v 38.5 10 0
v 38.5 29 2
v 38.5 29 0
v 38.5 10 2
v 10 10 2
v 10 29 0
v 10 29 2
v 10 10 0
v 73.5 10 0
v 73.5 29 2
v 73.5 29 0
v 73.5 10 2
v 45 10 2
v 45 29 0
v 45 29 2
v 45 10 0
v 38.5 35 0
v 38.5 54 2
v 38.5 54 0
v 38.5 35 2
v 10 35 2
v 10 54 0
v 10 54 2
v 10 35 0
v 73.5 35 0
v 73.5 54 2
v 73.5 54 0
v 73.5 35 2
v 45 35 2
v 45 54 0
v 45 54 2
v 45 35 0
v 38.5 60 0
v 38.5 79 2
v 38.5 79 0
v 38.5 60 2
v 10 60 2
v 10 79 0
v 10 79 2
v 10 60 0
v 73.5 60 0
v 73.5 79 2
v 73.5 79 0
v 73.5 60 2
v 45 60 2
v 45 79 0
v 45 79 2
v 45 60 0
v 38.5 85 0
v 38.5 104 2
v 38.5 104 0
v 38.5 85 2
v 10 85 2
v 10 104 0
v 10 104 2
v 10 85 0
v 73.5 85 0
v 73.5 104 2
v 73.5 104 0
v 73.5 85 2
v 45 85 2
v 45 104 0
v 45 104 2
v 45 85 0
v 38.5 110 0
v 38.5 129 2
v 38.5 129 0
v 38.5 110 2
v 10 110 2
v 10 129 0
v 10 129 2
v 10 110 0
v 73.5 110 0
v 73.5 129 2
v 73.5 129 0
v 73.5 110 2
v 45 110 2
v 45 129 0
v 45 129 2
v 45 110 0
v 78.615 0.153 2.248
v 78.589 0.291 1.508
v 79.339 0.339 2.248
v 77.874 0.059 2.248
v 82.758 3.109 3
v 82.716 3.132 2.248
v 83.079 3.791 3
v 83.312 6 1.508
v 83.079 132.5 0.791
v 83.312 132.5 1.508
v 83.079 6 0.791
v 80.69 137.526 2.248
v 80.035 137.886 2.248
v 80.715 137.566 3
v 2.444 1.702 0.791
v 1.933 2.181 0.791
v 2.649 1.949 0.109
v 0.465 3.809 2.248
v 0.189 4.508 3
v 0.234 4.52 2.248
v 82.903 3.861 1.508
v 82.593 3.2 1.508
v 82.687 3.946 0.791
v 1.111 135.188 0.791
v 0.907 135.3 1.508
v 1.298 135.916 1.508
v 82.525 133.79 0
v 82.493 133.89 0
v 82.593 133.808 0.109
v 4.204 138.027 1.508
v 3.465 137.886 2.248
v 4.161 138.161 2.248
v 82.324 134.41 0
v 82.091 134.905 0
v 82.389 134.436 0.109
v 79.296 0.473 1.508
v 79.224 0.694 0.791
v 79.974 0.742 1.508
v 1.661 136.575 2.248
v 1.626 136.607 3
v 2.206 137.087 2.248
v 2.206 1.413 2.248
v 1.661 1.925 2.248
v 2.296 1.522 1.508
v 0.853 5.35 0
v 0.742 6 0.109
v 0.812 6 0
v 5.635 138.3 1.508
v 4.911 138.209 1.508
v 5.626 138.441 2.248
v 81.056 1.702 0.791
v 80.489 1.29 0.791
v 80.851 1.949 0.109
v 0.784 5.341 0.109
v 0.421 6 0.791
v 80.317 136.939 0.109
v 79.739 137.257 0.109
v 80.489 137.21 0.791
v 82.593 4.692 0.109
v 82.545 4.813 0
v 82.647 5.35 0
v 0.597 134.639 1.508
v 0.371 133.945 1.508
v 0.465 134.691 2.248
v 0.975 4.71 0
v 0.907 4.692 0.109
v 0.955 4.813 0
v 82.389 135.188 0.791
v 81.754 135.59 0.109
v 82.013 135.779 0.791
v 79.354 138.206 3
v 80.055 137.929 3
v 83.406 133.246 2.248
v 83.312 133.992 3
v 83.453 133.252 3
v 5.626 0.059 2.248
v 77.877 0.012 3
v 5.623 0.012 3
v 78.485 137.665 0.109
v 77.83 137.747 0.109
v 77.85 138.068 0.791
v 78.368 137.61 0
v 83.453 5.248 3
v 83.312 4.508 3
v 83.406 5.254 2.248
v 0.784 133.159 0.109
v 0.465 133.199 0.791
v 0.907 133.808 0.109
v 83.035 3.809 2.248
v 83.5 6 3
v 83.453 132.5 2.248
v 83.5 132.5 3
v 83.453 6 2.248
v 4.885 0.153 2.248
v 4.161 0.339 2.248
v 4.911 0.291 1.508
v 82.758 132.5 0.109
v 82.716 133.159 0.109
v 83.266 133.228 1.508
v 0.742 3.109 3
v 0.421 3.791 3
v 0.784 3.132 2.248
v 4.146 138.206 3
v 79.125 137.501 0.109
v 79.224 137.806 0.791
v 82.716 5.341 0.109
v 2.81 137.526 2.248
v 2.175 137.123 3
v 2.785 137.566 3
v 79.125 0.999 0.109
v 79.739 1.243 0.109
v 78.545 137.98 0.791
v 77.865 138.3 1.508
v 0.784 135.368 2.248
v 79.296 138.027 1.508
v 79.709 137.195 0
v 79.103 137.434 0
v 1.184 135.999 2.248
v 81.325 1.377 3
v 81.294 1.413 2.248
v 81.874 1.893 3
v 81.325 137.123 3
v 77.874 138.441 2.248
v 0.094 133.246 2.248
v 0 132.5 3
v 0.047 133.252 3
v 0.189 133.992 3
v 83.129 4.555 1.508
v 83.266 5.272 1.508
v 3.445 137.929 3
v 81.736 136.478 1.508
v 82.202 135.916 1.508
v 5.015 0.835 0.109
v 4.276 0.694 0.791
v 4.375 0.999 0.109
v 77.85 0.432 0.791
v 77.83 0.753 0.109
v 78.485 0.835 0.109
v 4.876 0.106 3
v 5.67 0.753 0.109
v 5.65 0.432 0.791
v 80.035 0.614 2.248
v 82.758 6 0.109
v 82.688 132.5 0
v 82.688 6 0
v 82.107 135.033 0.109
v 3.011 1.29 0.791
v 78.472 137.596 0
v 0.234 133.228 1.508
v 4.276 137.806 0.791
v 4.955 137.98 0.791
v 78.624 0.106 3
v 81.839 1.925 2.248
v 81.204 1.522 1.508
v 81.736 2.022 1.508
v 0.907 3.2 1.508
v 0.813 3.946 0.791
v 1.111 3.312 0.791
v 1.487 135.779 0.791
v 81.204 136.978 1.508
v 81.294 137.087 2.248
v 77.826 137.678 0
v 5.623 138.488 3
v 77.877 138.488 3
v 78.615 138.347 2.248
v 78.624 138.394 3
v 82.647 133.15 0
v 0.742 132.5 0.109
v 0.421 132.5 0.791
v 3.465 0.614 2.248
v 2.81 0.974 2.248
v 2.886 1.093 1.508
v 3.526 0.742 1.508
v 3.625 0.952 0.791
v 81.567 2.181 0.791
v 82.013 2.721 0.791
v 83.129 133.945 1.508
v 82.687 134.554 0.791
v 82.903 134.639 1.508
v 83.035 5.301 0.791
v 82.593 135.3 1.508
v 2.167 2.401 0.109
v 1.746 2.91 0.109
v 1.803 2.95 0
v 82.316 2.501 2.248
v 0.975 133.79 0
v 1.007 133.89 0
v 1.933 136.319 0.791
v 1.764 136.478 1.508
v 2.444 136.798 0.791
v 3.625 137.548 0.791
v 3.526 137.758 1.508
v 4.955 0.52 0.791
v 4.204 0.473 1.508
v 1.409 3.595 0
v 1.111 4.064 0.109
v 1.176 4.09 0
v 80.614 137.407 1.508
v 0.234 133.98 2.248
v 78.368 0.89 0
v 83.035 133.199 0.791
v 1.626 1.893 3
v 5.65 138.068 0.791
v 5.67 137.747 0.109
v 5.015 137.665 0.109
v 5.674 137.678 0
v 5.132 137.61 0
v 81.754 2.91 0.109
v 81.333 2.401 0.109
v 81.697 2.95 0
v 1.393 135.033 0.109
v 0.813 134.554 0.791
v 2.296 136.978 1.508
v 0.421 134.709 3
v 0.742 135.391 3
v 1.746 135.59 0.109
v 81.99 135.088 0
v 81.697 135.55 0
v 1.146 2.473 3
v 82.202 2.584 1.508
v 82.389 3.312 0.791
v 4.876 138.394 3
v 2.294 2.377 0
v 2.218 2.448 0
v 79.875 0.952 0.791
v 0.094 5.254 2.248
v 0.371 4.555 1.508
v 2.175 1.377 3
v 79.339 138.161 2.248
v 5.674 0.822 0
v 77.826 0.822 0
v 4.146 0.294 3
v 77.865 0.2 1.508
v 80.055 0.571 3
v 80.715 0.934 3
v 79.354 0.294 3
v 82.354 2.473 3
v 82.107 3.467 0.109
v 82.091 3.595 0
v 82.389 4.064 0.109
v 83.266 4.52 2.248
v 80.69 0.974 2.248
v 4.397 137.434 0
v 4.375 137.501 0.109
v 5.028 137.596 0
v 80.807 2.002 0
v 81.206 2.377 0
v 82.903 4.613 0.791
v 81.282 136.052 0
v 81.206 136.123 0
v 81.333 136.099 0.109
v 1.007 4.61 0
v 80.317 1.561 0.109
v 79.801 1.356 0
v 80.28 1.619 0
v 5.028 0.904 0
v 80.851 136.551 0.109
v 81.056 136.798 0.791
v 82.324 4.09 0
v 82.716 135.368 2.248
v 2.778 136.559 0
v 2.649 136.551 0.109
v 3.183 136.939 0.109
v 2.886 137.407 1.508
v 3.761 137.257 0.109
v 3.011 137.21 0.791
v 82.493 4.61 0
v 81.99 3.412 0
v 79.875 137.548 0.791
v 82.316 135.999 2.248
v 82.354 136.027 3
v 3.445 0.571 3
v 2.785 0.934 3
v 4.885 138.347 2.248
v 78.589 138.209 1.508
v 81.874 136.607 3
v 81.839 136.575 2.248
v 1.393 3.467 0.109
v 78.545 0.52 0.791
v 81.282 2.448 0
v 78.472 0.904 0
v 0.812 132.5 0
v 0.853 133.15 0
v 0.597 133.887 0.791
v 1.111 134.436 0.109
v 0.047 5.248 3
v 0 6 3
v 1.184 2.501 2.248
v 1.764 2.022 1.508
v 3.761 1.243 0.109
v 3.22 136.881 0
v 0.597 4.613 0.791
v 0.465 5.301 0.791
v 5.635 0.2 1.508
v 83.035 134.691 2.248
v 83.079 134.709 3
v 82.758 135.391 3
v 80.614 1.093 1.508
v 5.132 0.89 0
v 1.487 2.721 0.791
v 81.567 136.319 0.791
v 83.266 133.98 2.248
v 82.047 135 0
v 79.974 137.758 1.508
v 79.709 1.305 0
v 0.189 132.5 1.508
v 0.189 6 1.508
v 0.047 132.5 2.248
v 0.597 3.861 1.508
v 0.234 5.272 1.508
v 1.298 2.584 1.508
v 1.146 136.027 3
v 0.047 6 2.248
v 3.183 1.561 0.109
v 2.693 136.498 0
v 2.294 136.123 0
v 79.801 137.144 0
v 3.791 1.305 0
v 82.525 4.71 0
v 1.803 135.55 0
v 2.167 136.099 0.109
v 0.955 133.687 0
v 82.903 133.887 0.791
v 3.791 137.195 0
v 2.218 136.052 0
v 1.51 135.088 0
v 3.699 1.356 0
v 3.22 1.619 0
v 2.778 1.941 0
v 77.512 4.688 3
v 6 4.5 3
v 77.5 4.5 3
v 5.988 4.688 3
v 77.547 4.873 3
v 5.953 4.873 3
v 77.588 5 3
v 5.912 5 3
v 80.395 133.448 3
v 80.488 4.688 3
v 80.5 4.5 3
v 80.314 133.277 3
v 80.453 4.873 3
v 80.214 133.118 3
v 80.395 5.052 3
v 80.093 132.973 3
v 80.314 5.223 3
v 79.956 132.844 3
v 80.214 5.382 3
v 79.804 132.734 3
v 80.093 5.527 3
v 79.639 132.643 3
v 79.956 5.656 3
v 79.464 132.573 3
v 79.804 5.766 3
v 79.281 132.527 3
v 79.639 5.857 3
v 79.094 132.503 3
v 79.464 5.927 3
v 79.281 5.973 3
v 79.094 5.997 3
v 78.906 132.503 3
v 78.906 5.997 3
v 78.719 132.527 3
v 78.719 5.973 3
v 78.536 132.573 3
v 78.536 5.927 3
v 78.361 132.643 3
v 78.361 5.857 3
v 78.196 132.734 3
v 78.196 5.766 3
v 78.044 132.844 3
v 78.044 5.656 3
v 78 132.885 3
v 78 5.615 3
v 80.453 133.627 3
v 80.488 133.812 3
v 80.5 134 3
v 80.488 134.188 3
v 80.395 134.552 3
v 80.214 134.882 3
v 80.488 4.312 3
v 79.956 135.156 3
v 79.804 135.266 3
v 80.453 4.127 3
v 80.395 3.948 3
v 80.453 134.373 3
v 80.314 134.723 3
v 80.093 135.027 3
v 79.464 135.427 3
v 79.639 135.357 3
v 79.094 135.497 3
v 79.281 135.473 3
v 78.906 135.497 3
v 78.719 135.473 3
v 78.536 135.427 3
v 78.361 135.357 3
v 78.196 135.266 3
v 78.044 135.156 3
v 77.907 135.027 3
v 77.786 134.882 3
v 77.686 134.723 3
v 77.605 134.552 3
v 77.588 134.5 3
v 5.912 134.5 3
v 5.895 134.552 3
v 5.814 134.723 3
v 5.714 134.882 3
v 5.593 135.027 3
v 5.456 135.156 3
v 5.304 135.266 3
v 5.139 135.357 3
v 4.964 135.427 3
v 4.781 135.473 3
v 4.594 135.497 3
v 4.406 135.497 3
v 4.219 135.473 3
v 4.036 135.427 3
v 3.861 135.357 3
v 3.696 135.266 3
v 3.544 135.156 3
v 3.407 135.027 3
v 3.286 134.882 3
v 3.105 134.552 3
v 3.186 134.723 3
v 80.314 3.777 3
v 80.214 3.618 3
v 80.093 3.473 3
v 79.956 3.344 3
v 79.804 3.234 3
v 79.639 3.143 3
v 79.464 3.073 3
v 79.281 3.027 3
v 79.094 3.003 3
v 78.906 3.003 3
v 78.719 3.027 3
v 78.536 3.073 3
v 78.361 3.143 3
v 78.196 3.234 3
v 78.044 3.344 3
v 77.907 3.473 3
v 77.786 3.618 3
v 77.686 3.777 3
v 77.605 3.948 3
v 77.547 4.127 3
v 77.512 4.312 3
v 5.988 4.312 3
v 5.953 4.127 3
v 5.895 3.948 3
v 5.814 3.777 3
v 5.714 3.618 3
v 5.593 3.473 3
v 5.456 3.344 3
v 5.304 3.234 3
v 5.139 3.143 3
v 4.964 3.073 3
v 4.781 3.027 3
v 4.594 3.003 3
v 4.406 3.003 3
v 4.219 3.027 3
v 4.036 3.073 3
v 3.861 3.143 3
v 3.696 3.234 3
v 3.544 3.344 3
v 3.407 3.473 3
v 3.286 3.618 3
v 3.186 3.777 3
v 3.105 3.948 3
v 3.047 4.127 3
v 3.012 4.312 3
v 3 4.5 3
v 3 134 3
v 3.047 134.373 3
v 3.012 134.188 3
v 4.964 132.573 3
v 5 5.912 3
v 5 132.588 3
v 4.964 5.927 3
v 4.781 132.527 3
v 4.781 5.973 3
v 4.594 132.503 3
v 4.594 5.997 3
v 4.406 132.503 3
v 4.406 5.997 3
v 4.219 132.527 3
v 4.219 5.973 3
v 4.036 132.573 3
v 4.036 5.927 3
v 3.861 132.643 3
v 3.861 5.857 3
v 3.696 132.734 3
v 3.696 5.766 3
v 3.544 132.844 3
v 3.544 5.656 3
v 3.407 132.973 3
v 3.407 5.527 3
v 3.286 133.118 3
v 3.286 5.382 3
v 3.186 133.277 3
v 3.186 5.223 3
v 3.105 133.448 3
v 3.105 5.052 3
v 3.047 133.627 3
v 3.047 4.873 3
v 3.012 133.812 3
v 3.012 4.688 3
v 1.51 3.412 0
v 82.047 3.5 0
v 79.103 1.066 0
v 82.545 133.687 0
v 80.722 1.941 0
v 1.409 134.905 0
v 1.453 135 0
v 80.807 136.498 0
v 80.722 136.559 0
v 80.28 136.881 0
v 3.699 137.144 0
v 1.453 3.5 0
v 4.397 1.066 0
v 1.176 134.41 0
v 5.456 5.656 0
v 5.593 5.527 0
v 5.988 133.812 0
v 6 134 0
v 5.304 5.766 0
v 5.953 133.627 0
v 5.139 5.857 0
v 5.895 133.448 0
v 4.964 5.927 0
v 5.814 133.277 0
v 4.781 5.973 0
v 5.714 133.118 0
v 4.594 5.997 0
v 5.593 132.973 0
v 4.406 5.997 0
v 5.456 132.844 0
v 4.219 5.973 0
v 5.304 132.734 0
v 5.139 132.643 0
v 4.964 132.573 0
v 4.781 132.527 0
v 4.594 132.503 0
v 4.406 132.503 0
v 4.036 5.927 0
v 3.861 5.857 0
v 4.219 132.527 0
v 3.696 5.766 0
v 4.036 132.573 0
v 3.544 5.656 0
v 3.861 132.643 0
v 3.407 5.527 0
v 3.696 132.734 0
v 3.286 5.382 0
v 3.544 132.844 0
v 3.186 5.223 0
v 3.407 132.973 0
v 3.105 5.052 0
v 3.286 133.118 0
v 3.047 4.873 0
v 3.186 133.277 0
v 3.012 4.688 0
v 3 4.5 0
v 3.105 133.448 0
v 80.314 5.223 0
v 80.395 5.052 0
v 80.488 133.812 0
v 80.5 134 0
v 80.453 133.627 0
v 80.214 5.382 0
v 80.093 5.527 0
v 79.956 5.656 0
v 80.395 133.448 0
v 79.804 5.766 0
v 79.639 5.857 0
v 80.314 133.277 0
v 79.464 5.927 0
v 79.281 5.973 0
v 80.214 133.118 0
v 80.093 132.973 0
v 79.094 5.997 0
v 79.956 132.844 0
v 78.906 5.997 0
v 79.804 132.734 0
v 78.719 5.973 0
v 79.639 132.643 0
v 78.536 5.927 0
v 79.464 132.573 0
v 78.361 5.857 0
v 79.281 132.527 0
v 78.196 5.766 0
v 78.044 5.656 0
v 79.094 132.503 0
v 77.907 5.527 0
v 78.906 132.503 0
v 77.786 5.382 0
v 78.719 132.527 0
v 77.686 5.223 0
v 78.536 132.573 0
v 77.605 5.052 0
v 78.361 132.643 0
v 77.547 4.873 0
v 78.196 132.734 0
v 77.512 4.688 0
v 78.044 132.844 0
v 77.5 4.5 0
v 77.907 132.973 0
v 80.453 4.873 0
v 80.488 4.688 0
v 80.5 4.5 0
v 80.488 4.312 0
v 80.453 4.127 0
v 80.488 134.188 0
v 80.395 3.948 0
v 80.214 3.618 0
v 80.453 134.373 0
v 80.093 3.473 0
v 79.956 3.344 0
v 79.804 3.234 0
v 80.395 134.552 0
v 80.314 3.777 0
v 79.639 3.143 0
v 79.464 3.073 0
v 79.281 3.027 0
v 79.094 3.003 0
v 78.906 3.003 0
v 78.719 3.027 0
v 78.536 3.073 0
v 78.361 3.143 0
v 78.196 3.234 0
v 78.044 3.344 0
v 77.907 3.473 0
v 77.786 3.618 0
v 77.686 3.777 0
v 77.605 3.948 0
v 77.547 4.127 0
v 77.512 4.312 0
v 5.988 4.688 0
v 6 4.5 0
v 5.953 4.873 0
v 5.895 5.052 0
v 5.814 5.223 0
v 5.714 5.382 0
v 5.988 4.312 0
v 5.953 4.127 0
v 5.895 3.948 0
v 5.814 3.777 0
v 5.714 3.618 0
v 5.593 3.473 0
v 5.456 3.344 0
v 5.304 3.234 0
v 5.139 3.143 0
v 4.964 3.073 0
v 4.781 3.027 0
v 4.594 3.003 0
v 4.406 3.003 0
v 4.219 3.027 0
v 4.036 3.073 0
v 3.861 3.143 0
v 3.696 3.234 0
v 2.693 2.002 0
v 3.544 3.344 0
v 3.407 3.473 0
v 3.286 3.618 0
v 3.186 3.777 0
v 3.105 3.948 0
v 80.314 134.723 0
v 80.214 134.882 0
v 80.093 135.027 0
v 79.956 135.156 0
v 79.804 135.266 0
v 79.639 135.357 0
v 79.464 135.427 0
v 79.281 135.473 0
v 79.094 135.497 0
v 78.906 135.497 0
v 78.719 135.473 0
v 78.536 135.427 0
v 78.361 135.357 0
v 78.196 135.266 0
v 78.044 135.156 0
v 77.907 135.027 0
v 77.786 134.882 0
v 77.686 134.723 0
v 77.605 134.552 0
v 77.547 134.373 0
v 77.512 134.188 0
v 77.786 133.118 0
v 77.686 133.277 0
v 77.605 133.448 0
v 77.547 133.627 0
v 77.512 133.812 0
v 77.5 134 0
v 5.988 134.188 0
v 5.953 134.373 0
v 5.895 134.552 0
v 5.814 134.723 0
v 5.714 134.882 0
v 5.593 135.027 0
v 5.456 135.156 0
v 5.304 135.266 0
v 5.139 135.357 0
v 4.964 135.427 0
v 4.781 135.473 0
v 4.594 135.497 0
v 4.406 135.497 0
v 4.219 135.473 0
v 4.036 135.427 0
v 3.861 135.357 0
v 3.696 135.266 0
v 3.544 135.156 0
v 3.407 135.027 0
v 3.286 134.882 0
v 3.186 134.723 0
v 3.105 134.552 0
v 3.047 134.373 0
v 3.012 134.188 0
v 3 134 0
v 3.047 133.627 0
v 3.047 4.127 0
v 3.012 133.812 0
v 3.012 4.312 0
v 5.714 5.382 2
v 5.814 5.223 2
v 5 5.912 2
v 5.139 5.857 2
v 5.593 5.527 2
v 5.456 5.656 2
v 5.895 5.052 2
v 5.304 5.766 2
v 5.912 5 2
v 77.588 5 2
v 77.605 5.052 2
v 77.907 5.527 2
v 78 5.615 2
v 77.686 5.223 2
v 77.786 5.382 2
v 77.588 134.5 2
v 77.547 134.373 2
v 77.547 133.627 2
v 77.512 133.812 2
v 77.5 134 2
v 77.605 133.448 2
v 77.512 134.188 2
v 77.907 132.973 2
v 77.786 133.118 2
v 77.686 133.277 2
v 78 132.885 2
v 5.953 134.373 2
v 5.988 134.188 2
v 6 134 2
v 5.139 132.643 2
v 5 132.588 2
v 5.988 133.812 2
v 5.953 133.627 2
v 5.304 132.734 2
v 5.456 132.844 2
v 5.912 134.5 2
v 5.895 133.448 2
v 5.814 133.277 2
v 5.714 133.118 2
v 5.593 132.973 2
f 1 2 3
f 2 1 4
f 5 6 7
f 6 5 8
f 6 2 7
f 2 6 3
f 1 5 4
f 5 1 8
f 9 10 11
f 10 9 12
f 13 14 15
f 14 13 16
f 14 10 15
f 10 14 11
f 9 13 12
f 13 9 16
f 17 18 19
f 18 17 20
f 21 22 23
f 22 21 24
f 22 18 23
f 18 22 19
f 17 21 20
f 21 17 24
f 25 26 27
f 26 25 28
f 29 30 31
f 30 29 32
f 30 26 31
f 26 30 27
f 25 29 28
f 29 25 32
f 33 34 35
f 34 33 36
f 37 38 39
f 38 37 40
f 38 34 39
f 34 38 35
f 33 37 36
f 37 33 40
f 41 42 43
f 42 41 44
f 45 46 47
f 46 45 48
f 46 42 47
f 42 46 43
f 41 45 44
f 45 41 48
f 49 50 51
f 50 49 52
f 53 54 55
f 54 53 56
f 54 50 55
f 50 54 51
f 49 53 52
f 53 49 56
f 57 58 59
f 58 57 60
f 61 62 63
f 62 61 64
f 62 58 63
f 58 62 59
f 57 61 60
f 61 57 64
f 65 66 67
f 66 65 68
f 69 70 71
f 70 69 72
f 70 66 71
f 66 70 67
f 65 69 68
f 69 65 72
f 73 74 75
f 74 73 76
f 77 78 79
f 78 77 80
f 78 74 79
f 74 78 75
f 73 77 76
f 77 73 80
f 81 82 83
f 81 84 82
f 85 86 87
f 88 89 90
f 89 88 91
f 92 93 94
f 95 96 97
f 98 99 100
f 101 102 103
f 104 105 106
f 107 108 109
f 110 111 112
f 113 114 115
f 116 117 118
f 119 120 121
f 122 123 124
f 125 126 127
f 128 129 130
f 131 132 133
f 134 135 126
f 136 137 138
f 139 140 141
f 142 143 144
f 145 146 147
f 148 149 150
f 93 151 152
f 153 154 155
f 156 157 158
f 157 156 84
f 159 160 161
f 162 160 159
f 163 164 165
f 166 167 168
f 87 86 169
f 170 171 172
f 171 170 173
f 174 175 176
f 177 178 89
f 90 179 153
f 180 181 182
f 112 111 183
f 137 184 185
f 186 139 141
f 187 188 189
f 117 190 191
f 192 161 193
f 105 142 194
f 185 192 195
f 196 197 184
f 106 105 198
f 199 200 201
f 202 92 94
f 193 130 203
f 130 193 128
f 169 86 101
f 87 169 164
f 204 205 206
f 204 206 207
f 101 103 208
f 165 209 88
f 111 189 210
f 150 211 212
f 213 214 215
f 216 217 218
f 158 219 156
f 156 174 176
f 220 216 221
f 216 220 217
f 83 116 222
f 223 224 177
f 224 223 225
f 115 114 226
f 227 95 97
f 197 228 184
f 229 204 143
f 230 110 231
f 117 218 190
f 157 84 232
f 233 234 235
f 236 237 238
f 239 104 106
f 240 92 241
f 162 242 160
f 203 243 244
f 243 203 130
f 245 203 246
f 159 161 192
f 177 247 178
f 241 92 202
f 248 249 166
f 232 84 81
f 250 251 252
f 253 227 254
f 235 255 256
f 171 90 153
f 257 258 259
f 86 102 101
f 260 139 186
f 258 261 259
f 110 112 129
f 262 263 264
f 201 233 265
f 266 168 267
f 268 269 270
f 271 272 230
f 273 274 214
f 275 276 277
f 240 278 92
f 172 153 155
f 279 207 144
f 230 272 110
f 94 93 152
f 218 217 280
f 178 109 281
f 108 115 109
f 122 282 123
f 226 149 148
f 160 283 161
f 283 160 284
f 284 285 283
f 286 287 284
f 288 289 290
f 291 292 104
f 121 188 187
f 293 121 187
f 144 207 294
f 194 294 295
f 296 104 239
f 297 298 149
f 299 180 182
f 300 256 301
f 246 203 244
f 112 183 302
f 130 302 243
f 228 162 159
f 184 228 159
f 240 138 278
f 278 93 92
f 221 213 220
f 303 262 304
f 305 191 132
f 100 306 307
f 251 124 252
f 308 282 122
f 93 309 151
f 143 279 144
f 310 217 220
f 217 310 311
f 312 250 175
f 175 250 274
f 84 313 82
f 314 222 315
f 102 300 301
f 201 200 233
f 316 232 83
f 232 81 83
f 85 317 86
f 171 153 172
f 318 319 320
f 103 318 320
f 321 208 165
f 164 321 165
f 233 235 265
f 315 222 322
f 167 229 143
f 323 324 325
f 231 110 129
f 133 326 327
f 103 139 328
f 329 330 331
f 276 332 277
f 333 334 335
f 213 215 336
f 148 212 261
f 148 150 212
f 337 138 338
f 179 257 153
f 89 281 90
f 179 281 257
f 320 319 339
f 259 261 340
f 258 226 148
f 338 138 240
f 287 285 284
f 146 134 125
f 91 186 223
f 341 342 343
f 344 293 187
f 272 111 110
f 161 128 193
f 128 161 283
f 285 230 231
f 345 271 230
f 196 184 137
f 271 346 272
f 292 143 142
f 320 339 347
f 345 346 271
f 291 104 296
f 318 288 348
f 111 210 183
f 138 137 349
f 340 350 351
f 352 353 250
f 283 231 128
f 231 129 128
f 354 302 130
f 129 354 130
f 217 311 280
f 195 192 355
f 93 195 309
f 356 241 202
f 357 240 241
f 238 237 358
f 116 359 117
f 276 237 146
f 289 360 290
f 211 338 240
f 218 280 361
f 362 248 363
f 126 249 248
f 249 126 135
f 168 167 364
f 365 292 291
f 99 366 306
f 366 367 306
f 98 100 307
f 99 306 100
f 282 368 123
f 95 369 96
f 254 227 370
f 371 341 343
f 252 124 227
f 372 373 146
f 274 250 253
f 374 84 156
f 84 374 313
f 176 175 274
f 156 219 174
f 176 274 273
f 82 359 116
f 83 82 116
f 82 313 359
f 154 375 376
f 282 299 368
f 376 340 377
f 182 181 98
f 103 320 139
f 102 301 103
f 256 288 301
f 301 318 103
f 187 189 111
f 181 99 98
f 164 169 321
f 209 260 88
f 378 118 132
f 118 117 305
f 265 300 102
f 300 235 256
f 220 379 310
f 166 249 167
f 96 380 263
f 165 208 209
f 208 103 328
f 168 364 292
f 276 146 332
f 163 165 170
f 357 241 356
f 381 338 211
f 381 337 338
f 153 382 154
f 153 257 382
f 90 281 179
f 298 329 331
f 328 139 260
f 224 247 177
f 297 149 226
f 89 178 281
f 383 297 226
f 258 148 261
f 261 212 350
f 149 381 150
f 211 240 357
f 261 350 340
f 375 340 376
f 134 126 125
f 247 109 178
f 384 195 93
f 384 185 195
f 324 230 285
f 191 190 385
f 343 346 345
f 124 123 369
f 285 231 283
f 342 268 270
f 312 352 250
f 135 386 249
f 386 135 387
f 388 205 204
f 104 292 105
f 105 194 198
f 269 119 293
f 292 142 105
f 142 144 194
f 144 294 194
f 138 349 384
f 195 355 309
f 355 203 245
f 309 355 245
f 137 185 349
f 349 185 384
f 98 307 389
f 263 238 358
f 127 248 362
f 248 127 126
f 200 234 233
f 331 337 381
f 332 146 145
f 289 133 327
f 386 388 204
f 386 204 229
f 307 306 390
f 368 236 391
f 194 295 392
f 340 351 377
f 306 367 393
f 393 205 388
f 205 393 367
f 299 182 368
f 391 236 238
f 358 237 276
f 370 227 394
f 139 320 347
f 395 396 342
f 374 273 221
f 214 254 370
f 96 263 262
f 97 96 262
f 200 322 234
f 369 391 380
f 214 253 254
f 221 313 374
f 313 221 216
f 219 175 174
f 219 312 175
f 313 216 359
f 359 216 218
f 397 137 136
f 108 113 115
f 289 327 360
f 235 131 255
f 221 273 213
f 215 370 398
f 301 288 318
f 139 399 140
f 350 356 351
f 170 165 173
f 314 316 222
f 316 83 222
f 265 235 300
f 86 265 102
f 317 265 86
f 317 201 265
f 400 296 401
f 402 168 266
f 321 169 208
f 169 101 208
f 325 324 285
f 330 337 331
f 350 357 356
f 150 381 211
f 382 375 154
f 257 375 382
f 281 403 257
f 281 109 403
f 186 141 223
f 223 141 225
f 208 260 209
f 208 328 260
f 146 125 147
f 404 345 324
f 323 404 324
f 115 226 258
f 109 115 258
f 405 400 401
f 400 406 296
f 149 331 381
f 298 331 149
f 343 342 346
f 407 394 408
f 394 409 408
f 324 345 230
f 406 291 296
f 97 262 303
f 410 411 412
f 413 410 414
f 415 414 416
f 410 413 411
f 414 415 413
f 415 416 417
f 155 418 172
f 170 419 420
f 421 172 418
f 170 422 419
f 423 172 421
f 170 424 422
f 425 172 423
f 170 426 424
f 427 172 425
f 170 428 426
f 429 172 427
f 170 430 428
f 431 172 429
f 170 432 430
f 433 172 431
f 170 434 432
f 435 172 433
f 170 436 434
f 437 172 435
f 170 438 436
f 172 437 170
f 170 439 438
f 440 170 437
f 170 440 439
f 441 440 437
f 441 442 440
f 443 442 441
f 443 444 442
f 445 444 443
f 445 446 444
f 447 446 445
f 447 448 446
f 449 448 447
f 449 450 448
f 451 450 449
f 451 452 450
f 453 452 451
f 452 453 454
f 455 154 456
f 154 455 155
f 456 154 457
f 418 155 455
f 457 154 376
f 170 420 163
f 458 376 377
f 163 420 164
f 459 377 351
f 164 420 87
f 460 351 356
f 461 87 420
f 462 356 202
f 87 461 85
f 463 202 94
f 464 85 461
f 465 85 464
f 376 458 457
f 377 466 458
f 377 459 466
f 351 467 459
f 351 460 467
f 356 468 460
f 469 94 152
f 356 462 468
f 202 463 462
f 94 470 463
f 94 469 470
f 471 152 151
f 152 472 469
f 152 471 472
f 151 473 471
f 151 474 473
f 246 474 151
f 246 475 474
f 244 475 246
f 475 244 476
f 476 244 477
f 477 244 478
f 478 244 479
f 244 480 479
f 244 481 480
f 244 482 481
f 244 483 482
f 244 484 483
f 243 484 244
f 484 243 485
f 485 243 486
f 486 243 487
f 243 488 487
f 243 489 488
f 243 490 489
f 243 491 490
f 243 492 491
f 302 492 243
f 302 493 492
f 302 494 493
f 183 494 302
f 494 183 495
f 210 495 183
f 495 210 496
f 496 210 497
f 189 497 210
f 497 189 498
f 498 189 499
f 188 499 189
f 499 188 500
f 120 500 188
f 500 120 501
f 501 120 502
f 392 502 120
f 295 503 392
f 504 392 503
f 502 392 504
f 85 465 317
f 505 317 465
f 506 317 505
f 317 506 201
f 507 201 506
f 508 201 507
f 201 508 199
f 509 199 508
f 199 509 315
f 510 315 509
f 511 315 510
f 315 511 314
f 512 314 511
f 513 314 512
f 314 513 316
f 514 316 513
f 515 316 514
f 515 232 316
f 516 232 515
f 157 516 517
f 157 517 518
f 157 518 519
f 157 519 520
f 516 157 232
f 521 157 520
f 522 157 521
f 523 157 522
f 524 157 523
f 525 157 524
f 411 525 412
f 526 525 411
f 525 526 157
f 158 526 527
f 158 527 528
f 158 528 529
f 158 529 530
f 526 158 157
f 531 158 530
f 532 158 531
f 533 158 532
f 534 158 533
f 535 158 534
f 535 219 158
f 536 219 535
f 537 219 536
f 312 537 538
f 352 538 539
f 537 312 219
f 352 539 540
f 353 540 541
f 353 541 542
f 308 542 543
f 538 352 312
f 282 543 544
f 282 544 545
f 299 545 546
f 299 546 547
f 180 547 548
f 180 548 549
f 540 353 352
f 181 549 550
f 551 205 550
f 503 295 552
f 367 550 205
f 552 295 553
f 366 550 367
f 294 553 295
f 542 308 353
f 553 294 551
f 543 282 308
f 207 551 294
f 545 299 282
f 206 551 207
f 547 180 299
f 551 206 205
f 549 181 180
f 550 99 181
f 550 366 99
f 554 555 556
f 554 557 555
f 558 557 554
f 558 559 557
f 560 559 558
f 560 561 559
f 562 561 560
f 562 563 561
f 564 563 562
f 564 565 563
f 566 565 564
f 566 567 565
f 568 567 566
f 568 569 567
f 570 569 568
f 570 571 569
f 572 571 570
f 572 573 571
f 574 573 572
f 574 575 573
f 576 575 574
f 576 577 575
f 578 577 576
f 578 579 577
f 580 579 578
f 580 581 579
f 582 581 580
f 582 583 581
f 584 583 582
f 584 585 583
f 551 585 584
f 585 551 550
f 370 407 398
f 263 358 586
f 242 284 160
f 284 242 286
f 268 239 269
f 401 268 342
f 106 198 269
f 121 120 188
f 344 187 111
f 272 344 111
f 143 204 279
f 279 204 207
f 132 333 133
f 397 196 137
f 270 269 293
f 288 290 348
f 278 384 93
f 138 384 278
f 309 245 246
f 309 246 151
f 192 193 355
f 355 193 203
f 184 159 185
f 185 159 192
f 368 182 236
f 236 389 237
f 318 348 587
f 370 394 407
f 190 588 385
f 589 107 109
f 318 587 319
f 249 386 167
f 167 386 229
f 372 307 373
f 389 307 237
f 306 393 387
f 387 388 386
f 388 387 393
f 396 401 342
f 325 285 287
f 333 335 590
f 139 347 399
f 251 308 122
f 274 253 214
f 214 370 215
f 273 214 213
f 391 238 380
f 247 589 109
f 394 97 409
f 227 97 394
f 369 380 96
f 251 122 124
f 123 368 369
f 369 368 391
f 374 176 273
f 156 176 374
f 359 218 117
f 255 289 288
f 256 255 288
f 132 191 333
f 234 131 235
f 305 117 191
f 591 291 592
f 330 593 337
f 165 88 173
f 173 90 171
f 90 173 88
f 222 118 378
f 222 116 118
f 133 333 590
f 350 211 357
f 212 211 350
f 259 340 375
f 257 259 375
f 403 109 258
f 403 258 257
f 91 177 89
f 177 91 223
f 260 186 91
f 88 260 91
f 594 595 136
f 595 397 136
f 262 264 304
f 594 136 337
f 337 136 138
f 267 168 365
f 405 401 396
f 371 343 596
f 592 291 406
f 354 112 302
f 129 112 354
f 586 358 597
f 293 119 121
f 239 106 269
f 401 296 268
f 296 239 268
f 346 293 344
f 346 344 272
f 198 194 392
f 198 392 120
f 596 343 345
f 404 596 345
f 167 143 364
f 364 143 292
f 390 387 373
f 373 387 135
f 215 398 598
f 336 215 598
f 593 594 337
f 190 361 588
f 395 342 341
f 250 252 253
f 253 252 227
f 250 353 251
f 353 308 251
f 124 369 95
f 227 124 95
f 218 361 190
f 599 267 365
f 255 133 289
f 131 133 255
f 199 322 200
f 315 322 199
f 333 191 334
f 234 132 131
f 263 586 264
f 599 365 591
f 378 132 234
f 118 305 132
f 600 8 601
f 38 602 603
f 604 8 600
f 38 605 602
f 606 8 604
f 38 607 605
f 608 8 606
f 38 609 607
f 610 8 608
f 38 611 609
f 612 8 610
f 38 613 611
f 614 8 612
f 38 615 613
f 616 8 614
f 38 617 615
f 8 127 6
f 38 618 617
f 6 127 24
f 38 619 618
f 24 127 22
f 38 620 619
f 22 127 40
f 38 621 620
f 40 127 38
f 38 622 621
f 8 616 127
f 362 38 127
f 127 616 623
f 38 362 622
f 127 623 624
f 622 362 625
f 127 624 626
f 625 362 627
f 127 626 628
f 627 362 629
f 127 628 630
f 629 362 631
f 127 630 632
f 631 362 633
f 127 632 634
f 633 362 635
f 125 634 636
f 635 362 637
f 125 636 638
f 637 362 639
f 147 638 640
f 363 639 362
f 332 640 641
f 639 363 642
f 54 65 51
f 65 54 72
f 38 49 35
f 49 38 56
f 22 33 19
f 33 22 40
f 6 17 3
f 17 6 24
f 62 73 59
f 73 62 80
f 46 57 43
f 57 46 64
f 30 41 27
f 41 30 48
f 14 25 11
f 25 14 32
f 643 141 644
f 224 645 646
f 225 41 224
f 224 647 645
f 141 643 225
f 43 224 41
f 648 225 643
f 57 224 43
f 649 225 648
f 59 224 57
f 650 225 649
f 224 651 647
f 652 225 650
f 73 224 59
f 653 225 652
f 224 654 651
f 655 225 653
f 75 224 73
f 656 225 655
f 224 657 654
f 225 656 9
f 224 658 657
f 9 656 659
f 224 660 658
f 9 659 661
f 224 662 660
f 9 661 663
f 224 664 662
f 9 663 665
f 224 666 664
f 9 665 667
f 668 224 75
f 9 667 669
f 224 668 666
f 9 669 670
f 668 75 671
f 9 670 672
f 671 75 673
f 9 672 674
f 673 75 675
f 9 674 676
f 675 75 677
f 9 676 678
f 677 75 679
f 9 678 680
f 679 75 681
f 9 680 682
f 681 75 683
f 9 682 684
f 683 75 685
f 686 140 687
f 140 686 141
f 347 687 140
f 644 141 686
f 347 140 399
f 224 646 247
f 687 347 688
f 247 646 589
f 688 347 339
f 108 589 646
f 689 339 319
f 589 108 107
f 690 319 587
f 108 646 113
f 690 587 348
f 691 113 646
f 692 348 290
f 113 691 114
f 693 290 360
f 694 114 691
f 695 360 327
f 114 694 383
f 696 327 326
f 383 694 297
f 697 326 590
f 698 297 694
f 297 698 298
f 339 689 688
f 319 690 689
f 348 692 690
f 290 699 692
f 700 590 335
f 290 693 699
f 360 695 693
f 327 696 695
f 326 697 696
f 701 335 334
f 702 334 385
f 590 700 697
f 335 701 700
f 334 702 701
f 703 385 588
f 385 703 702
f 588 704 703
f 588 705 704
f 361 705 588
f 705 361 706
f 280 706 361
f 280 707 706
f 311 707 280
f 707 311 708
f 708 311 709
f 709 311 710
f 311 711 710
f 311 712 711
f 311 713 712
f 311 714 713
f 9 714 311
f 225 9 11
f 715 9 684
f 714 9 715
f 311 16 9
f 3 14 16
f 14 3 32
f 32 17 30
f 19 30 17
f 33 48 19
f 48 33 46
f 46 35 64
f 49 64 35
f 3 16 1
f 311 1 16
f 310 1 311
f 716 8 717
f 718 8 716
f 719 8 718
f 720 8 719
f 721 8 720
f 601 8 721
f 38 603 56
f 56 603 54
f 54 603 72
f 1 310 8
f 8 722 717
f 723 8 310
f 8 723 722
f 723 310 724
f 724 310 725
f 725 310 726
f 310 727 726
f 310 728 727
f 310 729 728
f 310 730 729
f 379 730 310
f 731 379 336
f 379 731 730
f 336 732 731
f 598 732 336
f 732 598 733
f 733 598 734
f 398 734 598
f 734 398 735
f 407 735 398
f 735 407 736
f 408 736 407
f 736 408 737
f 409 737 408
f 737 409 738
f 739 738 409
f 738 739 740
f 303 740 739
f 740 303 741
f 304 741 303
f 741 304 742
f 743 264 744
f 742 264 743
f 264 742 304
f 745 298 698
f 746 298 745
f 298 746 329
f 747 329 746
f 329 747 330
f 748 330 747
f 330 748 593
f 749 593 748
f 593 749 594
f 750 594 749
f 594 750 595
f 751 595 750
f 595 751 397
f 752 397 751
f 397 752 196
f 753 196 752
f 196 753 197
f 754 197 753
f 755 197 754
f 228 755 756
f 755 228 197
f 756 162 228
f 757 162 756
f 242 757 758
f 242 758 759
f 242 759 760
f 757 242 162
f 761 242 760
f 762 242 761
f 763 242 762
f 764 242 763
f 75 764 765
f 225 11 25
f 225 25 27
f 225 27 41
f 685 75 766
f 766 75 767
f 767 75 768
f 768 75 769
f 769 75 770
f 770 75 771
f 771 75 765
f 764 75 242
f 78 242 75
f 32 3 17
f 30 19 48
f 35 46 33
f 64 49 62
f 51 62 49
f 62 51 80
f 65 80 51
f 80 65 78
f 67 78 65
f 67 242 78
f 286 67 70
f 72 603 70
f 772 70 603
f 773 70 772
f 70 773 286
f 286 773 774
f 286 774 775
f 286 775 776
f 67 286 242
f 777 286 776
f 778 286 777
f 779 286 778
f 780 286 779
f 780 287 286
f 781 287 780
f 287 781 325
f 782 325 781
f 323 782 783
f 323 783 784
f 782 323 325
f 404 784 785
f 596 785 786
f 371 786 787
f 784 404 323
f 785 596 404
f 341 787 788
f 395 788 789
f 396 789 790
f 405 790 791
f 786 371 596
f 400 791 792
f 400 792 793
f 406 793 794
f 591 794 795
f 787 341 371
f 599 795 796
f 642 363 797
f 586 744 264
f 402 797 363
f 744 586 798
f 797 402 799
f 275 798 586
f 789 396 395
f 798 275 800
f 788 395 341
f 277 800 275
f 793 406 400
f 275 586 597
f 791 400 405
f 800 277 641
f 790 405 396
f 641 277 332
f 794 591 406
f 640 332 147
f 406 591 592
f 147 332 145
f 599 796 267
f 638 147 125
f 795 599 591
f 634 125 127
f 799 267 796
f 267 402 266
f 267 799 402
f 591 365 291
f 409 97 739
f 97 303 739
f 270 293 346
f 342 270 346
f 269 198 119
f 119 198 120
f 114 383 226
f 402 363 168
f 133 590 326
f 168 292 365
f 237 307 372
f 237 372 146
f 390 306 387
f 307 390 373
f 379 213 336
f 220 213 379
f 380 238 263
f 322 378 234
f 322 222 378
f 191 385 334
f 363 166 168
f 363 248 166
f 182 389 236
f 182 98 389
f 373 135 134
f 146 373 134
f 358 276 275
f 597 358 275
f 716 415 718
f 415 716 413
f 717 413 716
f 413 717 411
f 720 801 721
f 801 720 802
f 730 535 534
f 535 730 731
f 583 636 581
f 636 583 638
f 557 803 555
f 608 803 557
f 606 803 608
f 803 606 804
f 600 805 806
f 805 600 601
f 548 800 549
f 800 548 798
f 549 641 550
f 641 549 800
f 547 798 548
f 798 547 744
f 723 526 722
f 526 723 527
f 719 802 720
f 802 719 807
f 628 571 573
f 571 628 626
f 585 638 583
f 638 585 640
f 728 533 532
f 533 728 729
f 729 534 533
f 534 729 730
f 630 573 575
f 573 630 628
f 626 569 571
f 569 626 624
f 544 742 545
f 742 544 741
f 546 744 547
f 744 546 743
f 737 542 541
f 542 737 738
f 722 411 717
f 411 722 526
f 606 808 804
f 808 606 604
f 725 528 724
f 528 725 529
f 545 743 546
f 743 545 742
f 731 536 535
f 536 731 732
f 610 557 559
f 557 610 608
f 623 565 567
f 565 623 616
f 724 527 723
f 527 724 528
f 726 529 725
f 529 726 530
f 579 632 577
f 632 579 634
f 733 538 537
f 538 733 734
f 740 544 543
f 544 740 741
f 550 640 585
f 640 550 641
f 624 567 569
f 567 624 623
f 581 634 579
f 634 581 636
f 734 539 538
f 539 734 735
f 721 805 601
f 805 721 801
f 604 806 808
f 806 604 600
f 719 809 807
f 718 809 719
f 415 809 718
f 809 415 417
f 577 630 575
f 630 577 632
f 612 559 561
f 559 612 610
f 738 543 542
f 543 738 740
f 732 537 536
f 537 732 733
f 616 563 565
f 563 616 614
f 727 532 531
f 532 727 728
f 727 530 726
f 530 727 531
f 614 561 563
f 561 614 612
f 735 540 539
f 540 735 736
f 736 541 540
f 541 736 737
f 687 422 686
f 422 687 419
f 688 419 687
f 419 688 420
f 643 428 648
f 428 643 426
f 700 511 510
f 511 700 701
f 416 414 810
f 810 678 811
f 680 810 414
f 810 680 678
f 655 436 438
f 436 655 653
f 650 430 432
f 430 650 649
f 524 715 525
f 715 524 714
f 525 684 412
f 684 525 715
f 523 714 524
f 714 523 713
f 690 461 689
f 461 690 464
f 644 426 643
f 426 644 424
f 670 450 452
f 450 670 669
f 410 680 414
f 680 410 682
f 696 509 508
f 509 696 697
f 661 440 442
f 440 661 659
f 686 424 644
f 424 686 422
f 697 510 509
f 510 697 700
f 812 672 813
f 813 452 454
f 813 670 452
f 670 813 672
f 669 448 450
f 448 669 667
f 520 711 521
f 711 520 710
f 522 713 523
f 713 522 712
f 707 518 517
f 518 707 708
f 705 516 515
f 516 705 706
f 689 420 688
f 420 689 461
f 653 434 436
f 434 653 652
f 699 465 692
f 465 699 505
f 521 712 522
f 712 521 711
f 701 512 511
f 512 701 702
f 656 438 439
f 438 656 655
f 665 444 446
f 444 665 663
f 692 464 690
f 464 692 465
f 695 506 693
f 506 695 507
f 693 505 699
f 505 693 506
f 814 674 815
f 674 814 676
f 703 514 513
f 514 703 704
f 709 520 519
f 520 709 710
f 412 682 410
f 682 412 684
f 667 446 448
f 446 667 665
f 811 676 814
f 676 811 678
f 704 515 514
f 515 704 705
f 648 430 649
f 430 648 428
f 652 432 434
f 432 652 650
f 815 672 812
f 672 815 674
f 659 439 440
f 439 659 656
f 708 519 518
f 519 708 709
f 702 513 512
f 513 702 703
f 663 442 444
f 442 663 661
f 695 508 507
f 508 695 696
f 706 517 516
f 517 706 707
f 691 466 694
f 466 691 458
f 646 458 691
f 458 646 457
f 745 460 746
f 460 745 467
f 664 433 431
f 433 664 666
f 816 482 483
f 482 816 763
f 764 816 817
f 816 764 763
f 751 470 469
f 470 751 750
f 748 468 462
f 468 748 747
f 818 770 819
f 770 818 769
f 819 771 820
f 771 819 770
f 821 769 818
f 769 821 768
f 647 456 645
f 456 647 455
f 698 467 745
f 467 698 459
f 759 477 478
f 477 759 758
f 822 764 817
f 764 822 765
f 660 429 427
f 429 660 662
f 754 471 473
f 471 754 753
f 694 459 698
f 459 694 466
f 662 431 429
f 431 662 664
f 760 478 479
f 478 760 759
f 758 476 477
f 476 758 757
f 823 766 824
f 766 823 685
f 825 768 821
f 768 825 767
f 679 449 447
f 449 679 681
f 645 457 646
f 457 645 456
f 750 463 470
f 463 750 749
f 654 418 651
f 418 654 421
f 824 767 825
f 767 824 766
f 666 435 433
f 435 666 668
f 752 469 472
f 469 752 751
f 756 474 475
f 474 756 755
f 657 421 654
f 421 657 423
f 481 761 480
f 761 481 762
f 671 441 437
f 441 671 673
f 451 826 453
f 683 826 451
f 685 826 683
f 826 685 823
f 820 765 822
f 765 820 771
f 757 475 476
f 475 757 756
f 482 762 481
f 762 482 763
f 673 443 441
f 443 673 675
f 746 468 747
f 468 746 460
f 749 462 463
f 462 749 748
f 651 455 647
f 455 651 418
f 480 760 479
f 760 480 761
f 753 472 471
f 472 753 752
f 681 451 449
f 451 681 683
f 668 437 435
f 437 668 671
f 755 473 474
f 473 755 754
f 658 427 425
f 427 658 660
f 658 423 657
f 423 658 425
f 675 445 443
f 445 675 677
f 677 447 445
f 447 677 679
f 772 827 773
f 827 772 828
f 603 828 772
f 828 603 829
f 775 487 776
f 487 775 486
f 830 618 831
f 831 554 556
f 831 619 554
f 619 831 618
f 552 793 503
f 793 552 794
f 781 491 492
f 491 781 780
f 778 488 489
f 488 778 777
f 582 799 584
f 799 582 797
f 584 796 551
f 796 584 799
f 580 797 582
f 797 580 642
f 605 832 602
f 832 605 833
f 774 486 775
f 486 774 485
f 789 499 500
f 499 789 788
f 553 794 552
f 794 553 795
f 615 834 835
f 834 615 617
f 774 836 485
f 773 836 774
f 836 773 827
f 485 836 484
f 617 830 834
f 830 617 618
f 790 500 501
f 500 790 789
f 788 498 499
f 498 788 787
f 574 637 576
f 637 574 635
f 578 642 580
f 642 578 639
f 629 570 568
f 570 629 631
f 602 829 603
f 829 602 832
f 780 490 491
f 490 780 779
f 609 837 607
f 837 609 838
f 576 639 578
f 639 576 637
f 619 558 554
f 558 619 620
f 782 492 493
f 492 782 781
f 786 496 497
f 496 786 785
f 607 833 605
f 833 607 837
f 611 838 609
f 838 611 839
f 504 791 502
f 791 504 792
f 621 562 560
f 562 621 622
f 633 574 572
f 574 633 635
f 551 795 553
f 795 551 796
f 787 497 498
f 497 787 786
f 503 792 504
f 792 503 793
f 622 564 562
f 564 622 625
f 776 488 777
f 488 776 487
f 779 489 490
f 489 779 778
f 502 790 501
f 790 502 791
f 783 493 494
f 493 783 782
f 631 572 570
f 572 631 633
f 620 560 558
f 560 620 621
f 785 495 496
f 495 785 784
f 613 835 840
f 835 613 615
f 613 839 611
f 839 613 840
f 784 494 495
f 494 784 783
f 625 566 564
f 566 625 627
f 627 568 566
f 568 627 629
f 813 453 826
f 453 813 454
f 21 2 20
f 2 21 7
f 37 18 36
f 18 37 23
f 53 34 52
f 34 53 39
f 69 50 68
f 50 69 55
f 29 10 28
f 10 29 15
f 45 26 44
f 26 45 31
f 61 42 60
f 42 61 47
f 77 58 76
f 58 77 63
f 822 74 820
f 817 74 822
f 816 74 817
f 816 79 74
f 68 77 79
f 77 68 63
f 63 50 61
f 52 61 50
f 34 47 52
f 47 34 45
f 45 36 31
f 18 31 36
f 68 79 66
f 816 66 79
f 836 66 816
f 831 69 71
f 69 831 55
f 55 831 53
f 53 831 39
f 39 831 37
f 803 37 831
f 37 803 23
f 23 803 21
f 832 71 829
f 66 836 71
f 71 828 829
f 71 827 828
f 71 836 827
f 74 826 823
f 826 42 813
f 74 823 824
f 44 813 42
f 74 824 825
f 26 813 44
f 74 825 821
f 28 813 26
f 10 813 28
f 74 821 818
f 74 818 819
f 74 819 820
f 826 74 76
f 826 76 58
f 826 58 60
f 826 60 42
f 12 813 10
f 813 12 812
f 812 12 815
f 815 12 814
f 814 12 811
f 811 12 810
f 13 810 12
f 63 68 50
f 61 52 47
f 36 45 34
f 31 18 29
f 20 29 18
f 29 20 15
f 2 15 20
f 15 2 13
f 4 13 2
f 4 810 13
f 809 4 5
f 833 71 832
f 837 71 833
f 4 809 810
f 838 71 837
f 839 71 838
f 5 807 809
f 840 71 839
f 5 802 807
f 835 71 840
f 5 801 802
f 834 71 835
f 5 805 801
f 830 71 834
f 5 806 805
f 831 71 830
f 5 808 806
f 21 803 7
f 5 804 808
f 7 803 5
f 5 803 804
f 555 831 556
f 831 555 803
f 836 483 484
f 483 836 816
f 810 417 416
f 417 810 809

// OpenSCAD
// file: face-plate.scad
module truncated_hemisphere(thickness)
{
	r = 2 * thickness;
	difference() {
		translate(v = [0, 0, thickness])
			sphere(r);
		translate(v = [0, 0, -r])
			cube(size = [2 * r, 2 * r, 2 * r], center = true);
		translate(v = [0, 0, 3 * thickness])
			cube(size = [2 * r, 2 * r, 2 * r], center = true);
	}
}

module face_plate(width, height, thickness)
{
	r = 2 * thickness;
	hull() {
		translate(v = [r, r, 0])
			truncated_hemisphere(r / 2);
		translate(v = [width - r, r, 0])
			truncated_hemisphere(r / 2);
		translate(v = [width - r, height - r, 0])
			truncated_hemisphere(r / 2);
		translate(v = [r, height - r, 0])
			truncated_hemisphere(r / 2);
	}
}
// file: large-switch-array-holder.scad
include <face-plate.scad>

/* This file provides 2 functions meant to be used:

   1. switch_array_holder(rows, cols);
   2. switch_holder_retaining_gasket(rows, cols);

*/


$fn = 50;

clearance = 0.5;
width = 33 + clearance;
height = 23 + clearance;
depth = 10;
outer_width = width + 3;
outer_height = height + 3;
edge_width = 6;

module switch_holder_screw_hole()
{
	translate(v = [0, 0, -1])
		cylinder(r1 = 1.5, r2 = 1.5, h = 10);
}

module switch_holder()
{
	translate(v = [0.5 * outer_width, 0.5 * outer_height, 0.5 * depth])
		difference() {
			cube(size = [outer_width, outer_height, depth], center = true);
			cube(size = [width, height, depth + 5], center = true);
		}
}

module switch_holder_array(r, c)
{
	union() {
		for (i = [0 : 1 : r - 1]) {
			translate(v = [0, (height + 1.5) * i, 0]) {
				for (j = [0 : 1 : c - 1]) {
					translate(v = [(width + 1.5) * j, 0, 0]) {
						switch_holder();
					}
				}
			}
		}
	}
}

module switch_holder_face_plate(r, c)
{
	w = c * (width + 1.5) + 1.5;
	h = r * (height + 1.5) + 1.5;
	thickness = 3;

	difference() {
		face_plate(w + 2 * edge_width, h + 2 * edge_width, 3);
		translate(v = [edge_width, edge_width, -3]) {
			cube(size = [w, h, 10]);
		}
		translate(v = [0.75 * edge_width, 0.75 * edge_width, 0])
			switch_holder_screw_hole();
		translate(v = [w + 1.25 * edge_width, 0.75 * edge_width, 0])
			switch_holder_screw_hole();
		translate(v = [w + 1.25 * edge_width, h + 1.25 * edge_width, 0])
			switch_holder_screw_hole();
		translate(v = [0.75 * edge_width, h + 1.25 * edge_width, 0])
			switch_holder_screw_hole();
	}
}

module switch_array_holder(r, c) {
	union() {
		switch_holder_face_plate(r, c);
		translate(v = [edge_width, edge_width, 0])
			switch_holder_array(r, c);
	}
}

module button_port()
{
	translate(v = [0, 0, -5])
		cube(size = [28.5, 19, 15]);
}

module switch_holder_retaining_gasket(r, c)
{
	w = c * (width + 1.5) + 1.5;
	h = r * (height + 1.5) + 1.5;
	difference() {
		face_plate(w + 2 * edge_width, h + 2 * edge_width, 3);
		translate(v = [edge_width + 4 , edge_width + 4, 0])
		for (i = [0 : 1 : r - 1]) {
			translate(v = [0, (height + 1.5) * i, 0]) {
				for (j = [0 : 1 : c - 1]) {
					translate(v = [(width + 1.5) * j, 0, 0]) {
						button_port();
					}
				}
			}
		}
		translate(v = [0.75 * edge_width, 0.75 * edge_width, 0])
			switch_holder_screw_hole();
		translate(v = [w + 1.25 * edge_width, 0.75 * edge_width, 0])
			switch_holder_screw_hole();
		translate(v = [w + 1.25 * edge_width, h + 1.25 * edge_width, 0])
			switch_holder_screw_hole();
		translate(v = [0.75 * edge_width, h + 1.25 * edge_width, 0])
			switch_holder_screw_hole();
		translate(v = [edge_width - 1, edge_width - 1, 2])
			cube(size = [c * (width + 2) + 2, r * (height + 2) + 2, 20]);
	}
}
/*
switch_array_holder(3, 4);
translate(v = [200, 0, 0])
	switch_holder_retaining_gasket(3, 4);
*/
// main file
rows=5;
cols=2;

include <large-switch-array-holder.scad>

switch_holder_retaining_gasket(rows, cols);
